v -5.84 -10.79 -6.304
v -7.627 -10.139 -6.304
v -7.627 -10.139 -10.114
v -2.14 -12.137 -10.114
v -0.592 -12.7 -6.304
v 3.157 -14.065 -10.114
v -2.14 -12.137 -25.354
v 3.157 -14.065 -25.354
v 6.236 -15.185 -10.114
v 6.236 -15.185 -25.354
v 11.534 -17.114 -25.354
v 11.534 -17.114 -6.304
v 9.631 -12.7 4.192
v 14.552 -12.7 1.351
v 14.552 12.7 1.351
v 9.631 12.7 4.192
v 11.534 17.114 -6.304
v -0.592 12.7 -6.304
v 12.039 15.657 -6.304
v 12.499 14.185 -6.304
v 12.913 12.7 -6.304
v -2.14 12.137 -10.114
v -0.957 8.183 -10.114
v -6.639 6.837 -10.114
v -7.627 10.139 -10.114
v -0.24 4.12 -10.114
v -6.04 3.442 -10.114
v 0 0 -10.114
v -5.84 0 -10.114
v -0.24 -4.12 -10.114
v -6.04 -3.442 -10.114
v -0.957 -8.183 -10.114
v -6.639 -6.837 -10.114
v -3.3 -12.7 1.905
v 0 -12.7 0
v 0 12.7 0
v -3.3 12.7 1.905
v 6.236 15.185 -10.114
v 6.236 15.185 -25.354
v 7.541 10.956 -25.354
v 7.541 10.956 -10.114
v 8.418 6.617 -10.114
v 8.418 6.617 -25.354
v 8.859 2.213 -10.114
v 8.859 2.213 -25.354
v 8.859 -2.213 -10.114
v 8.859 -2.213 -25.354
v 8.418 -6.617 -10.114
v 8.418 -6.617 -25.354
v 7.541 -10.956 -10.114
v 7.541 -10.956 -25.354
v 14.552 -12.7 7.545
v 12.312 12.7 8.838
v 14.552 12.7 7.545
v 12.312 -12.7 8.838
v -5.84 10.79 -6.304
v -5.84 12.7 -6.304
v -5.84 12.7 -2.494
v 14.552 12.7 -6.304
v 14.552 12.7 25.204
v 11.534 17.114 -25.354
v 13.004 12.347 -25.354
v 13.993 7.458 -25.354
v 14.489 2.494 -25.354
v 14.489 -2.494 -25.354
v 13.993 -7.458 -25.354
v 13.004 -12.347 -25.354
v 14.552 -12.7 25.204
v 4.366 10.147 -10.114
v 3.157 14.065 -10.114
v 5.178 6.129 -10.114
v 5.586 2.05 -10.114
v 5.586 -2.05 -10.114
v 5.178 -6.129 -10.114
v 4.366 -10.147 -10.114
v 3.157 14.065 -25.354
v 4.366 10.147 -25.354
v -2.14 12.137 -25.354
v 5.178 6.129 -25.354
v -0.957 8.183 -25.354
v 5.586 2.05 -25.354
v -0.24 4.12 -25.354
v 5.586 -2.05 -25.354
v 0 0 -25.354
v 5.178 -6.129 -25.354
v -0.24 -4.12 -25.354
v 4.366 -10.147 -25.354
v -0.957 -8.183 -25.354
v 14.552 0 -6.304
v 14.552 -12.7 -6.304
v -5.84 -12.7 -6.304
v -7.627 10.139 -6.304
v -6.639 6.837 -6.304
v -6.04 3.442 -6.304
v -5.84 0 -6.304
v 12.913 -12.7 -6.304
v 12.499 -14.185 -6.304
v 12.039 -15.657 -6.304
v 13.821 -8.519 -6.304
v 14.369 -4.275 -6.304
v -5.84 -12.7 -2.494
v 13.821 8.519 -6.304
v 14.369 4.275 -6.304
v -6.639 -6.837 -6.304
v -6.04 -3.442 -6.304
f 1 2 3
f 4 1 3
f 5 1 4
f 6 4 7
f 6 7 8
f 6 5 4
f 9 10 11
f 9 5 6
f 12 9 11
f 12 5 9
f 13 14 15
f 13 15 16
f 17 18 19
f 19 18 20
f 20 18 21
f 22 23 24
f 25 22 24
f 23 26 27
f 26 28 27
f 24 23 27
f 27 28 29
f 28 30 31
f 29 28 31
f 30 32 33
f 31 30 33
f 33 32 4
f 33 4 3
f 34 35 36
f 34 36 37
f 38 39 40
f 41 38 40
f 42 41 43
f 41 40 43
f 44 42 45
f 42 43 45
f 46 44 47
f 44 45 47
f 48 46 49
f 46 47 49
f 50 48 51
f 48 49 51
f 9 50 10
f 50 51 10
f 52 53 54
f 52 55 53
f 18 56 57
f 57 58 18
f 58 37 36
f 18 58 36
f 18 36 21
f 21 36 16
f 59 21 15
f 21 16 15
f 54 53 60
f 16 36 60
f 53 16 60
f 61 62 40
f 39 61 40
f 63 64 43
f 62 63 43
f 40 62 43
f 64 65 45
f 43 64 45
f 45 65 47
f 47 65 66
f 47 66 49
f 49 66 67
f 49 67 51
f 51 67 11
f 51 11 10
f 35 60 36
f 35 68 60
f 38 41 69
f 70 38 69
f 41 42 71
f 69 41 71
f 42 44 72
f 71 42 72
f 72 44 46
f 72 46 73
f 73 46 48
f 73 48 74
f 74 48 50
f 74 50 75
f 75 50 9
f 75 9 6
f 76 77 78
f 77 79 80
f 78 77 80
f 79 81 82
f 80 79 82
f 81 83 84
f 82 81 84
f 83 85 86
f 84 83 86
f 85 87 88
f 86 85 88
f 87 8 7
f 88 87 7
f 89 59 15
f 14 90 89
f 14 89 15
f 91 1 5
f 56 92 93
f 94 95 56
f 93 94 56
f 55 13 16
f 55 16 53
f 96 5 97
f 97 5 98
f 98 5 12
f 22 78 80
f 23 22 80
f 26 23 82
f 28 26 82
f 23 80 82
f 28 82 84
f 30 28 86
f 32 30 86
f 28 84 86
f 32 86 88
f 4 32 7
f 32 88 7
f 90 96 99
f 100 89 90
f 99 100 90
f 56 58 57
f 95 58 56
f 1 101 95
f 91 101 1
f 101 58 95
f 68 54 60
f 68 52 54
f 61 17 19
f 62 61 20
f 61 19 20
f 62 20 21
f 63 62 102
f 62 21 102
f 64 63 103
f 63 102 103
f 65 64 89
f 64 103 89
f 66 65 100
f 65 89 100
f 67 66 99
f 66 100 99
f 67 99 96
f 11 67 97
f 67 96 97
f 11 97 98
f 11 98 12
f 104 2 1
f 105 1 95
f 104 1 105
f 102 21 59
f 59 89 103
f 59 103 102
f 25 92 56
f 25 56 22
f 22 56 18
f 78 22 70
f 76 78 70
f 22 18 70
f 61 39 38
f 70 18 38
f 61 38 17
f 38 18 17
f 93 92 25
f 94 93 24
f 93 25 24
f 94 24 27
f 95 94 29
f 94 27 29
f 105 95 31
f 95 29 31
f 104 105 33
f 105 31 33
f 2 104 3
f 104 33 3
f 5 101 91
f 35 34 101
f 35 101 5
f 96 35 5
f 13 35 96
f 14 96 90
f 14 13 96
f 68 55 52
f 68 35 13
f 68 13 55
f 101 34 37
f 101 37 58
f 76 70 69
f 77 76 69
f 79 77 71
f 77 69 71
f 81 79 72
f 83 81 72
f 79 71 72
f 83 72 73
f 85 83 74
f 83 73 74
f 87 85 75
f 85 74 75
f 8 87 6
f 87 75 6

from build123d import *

# Parameters (mm, degrees)
F1_ANGLE = 40
F2_DEPTH = 12.7
F3_DEPTH = 12.7


with BuildPart() as f1:
    # F0 (on Front) → F1 (revolve, symmetric)
    with BuildSketch(Plane.XZ) as f1_sk:
        Polygon((14.551543, -6.304409), (-5.839557, -6.304409), (-5.839557, -10.114409), (0, -10.114409), (0, -25.354409), (5.637471, -25.354409), (5.637471, -10.114409), (8.914071, -10.114409), (8.914071, -25.354409), (14.551543, -25.354409), (14.551543, -10.114409), align=None)
    revolve(axis=Axis((-35.485129, 0, -12.677205), (0, 0, 1)), revolution_arc=F1_ANGLE / 2)
    revolve(f1_sk.sketch, axis=Axis((-35.485129, 0, -12.677205), (0, 0, -1)), revolution_arc=F1_ANGLE / 2)

    # F0 (on Front) → F2 (join)
    with BuildSketch(Plane.XZ):
        Polygon((14.551543, 25.204011), (0, 0), (-3.299557, 1.905), (-5.839557, -2.494409), (-5.839557, -6.304409), (14.551543, -6.304409), (14.551543, 1.351308), (9.63061, 4.19241), (12.312471, 8.837529), (14.551543, 7.544801), align=None)
    extrude(amount=F2_DEPTH)

    # F0 (on Front) → F3 (join)
    with BuildSketch(Plane.XZ):
        Polygon((14.551543, 25.204011), (0, 0), (-3.299557, 1.905), (-5.839557, -2.494409), (-5.839557, -6.304409), (14.551543, -6.304409), (14.551543, 1.351308), (9.63061, 4.19241), (12.312471, 8.837529), (14.551543, 7.544801), align=None)
    extrude(amount=-F3_DEPTH)


solid = f1.part
